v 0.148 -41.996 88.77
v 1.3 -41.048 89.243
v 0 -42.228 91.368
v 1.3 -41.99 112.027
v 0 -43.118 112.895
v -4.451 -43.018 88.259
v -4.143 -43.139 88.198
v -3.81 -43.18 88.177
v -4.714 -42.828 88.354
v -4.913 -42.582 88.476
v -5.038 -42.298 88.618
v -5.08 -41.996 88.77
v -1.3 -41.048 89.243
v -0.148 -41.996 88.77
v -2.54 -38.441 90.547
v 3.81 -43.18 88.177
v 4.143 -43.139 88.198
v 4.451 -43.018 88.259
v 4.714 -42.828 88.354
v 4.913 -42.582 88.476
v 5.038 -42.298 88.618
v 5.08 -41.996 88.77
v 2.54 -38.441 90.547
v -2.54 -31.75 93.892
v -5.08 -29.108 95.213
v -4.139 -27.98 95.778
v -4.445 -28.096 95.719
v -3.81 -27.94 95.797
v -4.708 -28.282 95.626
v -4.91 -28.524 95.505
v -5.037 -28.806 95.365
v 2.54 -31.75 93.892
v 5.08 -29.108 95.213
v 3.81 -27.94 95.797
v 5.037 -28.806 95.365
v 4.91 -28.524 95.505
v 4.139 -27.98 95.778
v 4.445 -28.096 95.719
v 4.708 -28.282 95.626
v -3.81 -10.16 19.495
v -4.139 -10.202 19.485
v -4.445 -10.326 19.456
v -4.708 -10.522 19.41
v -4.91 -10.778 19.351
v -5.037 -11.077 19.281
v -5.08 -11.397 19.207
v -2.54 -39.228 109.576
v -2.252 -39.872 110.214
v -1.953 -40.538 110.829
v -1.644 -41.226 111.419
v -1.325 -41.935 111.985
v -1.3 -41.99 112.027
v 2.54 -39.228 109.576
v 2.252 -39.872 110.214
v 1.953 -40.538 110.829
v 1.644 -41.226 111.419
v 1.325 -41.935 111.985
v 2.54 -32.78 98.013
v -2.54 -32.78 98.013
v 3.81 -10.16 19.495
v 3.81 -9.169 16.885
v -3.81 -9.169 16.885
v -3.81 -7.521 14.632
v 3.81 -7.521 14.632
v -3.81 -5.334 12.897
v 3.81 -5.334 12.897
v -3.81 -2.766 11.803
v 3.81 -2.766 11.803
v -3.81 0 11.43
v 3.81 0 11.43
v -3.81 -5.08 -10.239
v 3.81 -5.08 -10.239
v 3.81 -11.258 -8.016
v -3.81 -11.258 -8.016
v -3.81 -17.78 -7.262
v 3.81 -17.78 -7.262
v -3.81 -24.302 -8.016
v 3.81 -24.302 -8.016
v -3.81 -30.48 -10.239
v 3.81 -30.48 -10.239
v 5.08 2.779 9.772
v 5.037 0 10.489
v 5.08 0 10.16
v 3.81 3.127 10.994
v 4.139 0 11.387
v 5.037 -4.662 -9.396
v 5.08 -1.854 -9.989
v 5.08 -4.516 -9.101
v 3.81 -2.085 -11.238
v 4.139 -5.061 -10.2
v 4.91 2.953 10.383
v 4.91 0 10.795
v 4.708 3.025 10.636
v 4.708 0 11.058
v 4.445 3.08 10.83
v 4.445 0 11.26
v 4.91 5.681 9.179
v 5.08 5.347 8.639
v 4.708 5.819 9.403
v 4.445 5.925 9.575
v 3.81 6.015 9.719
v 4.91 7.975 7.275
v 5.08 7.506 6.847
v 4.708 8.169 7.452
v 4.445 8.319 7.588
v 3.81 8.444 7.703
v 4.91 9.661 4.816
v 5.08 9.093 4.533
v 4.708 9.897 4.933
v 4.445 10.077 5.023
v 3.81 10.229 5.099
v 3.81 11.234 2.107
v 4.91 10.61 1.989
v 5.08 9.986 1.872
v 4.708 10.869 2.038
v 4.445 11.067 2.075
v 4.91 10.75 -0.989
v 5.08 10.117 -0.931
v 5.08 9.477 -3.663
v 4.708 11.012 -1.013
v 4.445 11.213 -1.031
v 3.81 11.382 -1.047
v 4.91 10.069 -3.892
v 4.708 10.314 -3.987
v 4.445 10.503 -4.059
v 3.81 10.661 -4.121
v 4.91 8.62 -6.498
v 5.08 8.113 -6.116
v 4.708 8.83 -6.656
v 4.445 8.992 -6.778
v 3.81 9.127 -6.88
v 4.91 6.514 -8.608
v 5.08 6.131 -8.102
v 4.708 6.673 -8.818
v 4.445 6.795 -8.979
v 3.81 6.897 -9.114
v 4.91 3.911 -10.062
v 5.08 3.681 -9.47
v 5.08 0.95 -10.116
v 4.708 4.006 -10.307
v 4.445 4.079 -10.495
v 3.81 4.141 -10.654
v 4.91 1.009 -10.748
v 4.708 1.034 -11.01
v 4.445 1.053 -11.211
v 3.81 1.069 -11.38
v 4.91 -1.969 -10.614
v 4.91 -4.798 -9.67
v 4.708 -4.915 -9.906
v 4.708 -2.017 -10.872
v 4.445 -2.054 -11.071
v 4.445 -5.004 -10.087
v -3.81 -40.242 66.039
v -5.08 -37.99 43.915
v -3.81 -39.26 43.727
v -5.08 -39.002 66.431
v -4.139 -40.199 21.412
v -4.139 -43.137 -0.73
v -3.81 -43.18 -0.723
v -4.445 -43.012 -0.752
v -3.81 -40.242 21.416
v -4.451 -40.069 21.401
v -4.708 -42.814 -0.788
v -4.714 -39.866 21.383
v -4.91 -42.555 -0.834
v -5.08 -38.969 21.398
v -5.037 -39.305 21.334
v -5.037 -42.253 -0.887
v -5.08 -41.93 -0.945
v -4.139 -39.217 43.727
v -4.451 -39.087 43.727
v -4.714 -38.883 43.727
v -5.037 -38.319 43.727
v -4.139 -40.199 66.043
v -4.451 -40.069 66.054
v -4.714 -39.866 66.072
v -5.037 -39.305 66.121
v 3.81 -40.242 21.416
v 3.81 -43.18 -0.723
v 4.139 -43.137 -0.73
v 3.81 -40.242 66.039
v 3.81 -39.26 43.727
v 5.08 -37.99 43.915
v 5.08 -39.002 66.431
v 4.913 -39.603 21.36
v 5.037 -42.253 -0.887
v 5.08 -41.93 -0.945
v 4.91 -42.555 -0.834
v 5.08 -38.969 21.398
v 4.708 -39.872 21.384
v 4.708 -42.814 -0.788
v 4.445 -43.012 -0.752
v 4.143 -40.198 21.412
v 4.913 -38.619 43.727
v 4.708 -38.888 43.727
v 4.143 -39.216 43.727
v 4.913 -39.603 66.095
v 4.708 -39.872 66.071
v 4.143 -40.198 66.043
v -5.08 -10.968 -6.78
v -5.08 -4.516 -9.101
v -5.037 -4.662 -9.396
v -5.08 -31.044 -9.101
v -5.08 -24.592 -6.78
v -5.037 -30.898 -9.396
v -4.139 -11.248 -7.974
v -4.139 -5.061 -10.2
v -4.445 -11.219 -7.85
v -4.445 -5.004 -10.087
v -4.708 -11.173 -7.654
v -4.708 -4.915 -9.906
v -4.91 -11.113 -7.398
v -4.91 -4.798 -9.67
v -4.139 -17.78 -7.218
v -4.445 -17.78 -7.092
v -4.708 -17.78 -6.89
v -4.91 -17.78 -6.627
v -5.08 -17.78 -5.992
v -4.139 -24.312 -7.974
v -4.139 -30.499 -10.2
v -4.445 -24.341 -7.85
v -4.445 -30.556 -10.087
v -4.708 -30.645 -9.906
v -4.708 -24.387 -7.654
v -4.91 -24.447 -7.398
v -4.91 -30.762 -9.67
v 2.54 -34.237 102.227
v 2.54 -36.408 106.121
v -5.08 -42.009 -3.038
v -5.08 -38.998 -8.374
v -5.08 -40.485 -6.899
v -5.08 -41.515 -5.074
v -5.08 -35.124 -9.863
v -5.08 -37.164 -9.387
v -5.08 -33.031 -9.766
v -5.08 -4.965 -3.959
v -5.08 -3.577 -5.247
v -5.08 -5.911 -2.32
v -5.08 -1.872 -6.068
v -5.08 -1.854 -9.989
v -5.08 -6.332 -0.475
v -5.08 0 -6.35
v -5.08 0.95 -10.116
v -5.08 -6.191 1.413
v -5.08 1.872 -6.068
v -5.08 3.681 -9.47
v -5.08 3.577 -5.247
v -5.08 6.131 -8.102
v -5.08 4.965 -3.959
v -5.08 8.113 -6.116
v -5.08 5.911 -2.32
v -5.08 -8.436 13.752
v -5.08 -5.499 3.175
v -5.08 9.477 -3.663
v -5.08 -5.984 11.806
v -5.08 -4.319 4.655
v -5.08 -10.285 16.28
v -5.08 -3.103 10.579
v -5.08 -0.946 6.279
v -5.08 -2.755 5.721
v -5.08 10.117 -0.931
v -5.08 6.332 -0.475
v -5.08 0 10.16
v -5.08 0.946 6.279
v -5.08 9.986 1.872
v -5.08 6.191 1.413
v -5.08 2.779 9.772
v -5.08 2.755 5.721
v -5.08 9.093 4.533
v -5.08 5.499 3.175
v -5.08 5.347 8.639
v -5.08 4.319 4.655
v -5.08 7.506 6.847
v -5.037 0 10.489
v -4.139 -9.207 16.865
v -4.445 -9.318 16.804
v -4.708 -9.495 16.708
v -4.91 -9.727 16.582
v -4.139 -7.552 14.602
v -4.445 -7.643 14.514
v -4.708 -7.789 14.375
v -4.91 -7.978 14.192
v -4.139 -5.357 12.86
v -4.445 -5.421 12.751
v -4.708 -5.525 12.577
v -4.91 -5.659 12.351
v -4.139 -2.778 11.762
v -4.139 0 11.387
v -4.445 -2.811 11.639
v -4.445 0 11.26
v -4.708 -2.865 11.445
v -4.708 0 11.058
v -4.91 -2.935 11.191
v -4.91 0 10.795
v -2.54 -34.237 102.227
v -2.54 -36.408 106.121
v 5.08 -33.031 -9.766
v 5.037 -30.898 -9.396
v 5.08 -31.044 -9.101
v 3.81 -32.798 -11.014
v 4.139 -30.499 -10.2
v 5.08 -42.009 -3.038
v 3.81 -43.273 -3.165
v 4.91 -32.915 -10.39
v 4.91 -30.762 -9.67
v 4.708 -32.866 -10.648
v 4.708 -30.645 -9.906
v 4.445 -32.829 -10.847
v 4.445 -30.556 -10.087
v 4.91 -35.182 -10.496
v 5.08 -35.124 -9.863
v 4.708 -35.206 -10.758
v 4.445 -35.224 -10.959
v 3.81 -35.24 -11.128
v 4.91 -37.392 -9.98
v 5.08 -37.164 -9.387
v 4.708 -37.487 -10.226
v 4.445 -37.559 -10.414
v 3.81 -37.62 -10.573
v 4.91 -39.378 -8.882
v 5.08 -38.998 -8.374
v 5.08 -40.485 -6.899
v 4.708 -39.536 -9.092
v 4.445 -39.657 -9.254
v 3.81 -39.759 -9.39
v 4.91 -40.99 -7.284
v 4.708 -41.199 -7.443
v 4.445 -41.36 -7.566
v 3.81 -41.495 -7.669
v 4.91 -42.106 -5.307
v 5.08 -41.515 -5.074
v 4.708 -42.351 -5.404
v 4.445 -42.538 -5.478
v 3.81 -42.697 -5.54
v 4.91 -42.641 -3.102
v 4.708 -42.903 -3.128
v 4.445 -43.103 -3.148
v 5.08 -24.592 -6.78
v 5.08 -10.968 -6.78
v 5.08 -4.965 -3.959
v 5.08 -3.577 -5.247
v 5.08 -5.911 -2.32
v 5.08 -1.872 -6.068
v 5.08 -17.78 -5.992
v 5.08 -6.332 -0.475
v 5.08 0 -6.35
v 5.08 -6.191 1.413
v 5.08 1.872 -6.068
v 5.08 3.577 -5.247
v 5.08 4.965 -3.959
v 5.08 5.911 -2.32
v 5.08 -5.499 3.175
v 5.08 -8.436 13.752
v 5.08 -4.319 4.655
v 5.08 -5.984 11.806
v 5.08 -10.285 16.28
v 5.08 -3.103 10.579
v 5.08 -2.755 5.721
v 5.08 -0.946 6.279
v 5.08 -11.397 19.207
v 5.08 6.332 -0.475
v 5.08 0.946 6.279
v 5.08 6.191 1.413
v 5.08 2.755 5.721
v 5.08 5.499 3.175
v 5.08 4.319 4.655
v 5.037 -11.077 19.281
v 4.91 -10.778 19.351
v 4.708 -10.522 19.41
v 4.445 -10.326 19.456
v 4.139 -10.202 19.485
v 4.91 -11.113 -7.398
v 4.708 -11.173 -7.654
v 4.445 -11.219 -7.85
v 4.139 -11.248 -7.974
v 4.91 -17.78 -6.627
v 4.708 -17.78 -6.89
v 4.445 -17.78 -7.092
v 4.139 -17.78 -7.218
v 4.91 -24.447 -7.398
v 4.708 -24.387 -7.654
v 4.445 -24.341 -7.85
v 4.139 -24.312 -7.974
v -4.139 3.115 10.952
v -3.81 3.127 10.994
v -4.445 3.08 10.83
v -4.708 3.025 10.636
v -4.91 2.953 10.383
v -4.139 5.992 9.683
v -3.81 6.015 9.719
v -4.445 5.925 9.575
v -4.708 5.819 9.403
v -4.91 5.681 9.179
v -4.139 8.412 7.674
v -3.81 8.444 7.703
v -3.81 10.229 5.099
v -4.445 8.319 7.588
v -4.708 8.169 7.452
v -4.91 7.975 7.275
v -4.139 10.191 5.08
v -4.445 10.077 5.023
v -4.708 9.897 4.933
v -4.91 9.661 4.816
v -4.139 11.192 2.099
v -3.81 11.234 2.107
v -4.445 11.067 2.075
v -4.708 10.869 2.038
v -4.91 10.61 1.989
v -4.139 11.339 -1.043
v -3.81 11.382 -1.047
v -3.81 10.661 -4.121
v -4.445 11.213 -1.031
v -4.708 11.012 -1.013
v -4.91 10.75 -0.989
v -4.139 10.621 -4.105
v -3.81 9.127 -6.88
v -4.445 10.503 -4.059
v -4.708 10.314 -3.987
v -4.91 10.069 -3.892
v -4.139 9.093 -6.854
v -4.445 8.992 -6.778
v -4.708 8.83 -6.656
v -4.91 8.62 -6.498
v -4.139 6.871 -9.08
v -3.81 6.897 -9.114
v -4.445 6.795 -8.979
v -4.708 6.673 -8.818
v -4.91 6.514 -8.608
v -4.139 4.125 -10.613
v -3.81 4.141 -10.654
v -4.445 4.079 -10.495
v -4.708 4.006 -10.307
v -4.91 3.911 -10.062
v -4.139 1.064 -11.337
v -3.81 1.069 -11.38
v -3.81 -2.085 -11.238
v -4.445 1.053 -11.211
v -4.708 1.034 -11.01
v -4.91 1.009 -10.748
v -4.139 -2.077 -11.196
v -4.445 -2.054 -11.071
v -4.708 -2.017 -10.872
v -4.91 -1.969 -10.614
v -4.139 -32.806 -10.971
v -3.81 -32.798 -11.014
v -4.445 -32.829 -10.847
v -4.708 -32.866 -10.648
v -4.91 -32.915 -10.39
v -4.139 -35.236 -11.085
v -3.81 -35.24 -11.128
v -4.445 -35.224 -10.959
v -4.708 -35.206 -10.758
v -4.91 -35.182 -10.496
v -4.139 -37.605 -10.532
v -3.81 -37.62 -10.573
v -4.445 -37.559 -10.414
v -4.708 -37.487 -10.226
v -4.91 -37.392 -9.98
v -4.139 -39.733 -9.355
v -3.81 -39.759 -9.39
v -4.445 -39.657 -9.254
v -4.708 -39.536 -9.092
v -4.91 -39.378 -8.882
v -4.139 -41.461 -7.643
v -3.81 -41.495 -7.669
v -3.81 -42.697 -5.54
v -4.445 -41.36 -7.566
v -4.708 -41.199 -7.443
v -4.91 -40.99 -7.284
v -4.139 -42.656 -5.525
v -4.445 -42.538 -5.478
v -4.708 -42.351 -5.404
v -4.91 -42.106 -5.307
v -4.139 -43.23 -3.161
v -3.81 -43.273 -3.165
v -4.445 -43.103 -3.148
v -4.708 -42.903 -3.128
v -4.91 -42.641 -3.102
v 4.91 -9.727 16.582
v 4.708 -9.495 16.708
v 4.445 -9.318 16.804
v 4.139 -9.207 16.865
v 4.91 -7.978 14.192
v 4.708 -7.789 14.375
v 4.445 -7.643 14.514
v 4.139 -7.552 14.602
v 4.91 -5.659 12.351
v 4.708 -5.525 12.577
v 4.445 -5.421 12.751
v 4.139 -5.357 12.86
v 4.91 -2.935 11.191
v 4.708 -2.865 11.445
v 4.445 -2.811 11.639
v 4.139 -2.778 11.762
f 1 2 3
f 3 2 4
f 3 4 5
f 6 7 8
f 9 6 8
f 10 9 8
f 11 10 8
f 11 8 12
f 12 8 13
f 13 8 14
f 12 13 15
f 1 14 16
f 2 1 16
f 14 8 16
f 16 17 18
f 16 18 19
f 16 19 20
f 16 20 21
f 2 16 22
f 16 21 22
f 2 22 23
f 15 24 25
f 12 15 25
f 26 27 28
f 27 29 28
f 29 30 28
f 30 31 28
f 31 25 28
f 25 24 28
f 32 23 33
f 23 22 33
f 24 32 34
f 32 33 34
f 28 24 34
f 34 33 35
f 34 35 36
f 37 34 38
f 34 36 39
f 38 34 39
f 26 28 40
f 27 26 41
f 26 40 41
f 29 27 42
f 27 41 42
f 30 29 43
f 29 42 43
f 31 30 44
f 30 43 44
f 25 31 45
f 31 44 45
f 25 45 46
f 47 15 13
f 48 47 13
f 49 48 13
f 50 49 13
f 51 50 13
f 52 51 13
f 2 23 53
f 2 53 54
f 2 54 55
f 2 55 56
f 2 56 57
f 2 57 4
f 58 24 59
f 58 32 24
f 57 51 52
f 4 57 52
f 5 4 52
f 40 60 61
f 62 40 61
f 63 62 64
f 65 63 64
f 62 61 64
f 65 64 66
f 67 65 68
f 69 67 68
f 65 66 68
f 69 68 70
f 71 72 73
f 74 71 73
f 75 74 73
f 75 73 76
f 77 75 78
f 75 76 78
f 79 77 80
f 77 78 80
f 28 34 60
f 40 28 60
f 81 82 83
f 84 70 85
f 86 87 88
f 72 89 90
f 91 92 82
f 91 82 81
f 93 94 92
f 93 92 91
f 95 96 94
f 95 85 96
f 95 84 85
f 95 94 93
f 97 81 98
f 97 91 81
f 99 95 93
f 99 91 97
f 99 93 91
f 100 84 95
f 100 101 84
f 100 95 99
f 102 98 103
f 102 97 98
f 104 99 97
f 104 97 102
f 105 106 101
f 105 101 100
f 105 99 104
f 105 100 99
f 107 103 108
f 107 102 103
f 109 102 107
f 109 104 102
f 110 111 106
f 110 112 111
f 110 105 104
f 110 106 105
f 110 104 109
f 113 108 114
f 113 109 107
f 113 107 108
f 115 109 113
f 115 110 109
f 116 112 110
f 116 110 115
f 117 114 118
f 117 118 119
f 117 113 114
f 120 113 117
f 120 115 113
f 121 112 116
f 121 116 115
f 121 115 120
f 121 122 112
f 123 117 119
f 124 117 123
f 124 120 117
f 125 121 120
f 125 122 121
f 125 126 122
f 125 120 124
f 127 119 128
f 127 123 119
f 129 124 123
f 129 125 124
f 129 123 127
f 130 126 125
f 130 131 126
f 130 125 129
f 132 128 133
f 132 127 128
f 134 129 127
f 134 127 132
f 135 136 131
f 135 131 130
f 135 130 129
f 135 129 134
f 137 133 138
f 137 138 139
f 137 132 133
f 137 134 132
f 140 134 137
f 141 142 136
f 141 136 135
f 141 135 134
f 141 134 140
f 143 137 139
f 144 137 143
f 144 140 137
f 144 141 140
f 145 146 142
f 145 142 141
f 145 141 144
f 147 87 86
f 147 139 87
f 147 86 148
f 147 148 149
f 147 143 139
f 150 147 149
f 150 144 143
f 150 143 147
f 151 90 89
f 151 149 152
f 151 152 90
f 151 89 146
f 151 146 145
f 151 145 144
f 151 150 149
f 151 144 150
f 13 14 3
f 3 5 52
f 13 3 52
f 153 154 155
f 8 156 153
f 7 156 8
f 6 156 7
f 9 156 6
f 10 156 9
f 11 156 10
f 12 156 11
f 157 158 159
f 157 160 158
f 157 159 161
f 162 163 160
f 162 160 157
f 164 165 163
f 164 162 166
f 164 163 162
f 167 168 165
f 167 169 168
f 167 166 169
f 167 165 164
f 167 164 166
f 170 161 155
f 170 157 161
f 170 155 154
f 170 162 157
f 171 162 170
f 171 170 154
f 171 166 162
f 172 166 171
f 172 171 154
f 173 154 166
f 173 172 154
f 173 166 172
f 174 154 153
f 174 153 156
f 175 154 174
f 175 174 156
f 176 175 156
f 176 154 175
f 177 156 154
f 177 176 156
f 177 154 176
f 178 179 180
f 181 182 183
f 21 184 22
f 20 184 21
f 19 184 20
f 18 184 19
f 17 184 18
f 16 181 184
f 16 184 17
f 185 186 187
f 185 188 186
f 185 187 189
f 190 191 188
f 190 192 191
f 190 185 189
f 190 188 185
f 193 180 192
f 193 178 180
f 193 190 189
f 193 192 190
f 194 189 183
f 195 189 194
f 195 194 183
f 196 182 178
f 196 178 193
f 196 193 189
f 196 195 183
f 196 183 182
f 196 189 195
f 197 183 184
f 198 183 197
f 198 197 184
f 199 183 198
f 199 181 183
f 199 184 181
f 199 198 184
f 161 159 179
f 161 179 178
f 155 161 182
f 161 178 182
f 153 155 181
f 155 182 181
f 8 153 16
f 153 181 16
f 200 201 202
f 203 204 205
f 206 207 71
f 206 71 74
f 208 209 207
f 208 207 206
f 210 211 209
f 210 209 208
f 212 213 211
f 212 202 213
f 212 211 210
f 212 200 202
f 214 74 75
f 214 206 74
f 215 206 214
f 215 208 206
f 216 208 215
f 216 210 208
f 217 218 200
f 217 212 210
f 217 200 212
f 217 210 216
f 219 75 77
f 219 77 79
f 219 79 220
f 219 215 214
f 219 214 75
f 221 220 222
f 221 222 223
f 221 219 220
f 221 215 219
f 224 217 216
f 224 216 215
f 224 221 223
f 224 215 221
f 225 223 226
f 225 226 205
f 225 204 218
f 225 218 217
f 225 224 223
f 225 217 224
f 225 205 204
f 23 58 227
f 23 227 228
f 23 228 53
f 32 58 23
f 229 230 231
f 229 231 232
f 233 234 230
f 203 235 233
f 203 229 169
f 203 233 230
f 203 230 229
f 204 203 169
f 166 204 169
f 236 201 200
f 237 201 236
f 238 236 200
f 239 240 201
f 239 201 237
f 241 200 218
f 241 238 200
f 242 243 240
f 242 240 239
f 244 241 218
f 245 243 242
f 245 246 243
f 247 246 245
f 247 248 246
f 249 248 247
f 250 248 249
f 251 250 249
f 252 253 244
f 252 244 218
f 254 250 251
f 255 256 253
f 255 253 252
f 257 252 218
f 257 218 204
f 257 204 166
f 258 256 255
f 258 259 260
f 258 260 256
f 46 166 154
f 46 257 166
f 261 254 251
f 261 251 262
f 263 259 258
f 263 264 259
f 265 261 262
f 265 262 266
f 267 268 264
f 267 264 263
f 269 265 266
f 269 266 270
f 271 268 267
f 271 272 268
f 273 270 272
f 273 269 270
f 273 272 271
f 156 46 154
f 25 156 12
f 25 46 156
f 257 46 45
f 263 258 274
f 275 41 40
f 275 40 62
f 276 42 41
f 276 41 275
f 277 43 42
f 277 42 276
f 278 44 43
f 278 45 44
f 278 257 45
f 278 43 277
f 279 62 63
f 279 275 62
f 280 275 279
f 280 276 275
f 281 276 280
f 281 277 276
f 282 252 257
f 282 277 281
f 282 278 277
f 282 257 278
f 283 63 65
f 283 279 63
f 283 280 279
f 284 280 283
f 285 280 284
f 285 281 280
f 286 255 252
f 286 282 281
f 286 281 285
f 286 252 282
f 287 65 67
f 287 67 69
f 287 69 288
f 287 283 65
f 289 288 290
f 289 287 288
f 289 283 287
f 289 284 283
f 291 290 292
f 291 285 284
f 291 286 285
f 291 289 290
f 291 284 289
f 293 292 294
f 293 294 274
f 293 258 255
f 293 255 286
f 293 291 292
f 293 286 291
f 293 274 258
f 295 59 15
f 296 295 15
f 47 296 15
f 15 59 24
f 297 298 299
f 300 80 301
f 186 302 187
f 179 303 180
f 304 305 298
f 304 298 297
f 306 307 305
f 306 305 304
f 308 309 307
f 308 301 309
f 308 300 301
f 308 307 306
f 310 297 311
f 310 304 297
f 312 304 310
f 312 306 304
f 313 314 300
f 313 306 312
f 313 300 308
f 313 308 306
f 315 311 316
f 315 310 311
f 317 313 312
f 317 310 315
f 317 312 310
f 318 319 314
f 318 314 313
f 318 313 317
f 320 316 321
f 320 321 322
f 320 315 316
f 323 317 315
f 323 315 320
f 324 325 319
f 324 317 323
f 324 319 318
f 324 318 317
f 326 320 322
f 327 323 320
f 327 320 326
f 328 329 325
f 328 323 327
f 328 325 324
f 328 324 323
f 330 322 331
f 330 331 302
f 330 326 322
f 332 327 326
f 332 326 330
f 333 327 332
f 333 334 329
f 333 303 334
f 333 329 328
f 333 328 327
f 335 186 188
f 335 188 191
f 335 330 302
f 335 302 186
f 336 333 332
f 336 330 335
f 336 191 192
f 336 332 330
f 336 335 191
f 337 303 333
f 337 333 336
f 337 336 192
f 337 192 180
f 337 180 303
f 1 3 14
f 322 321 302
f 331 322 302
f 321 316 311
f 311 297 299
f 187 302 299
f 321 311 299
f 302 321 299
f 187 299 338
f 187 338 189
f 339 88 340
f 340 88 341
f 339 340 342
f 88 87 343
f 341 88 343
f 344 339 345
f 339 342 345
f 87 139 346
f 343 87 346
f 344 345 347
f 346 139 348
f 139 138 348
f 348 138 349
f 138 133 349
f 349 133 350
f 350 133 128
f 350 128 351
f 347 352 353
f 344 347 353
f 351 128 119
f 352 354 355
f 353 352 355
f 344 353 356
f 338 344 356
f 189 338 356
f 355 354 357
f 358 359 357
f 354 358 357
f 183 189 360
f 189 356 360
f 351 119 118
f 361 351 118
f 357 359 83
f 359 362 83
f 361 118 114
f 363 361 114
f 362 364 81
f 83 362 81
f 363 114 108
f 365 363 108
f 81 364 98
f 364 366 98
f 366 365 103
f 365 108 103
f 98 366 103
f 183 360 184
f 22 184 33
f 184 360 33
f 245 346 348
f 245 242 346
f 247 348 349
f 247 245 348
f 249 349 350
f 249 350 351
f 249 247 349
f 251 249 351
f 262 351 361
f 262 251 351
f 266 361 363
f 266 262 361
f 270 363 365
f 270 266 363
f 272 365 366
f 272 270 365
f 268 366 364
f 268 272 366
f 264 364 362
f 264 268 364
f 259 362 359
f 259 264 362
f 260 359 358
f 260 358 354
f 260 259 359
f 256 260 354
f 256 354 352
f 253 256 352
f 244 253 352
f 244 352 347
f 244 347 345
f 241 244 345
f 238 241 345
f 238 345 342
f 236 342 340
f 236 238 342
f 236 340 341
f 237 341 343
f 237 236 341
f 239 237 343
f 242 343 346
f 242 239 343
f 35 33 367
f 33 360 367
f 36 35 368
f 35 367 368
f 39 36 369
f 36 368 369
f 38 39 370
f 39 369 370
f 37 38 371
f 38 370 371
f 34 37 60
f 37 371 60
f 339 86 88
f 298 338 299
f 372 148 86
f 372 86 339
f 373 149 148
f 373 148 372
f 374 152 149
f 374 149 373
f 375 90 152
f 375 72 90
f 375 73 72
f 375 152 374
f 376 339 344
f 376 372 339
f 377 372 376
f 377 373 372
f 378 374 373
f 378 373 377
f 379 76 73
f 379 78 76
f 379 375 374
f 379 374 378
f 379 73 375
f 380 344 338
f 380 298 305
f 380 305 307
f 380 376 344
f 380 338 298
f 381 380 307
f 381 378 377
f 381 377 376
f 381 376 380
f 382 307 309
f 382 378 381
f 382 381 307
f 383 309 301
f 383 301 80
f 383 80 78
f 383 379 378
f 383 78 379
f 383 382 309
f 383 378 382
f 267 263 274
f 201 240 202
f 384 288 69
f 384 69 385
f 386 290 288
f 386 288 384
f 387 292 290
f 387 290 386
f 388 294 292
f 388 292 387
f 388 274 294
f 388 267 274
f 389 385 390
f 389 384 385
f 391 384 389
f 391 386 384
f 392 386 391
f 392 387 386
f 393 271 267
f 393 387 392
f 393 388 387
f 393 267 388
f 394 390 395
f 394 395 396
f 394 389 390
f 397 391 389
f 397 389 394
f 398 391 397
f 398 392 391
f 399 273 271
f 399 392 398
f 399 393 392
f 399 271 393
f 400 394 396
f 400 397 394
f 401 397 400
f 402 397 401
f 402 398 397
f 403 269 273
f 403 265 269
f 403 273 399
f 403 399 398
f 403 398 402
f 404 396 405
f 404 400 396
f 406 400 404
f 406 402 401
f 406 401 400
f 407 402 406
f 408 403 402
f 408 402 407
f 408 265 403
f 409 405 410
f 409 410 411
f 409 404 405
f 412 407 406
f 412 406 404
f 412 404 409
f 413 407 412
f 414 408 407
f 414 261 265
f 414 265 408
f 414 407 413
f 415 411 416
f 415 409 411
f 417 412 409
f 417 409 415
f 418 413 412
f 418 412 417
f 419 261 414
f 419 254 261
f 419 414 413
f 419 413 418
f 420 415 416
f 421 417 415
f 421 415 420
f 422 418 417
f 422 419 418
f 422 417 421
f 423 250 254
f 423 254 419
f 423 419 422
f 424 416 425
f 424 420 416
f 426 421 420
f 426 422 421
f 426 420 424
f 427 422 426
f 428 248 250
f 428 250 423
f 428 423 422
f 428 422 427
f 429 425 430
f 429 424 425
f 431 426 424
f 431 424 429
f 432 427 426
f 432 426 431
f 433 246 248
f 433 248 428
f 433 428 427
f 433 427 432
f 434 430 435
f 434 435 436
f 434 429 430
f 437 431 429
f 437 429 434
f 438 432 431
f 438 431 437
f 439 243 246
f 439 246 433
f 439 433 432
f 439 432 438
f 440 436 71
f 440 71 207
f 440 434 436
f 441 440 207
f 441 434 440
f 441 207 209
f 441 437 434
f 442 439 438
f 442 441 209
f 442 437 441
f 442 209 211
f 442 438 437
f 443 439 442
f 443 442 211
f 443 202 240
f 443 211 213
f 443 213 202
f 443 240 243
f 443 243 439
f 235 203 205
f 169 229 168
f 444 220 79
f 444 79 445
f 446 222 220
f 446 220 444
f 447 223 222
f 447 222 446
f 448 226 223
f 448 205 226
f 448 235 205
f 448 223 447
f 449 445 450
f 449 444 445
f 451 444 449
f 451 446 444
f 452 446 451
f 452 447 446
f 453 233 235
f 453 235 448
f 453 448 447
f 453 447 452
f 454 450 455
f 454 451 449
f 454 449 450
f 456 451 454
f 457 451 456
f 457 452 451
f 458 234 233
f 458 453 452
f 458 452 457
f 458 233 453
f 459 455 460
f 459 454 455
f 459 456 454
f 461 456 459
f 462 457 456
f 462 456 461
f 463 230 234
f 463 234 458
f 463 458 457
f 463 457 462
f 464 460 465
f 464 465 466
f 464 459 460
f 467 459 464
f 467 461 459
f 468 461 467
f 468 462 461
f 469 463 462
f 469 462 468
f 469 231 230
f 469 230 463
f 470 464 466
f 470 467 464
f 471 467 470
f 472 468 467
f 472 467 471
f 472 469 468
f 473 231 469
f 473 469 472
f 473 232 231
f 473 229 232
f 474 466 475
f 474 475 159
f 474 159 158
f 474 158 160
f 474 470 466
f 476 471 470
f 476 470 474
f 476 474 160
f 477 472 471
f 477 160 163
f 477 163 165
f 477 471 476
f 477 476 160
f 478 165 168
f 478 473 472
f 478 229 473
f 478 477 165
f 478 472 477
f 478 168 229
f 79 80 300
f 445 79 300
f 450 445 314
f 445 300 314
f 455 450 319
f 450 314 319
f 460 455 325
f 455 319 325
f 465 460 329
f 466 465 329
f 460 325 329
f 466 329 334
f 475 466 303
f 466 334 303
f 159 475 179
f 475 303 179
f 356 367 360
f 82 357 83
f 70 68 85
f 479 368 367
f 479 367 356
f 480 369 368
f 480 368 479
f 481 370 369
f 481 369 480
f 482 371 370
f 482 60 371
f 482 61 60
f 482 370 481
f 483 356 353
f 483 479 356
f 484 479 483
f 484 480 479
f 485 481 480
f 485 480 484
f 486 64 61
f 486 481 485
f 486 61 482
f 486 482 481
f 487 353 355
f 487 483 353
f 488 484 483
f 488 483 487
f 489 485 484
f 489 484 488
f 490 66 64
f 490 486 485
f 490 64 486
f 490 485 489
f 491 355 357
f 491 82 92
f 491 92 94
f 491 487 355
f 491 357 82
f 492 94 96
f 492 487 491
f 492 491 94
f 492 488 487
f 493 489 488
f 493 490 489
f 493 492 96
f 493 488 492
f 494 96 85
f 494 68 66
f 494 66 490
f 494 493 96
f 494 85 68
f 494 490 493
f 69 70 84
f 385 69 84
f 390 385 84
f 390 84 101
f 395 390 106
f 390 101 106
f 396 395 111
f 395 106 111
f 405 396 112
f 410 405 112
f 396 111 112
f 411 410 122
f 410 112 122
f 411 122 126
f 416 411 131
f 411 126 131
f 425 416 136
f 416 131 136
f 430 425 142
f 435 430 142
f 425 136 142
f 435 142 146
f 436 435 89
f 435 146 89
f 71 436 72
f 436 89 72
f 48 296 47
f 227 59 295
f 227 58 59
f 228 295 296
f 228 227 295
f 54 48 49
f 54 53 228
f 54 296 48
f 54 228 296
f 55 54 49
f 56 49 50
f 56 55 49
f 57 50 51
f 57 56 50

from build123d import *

# Parameters (mm, degrees)
SKETCH1_R           = 6.35
BOSS_EXTRUDE1_DEPTH = 5.08
FILLET1_R           = 1.27
BOSS_EXTRUDE2_DEPTH = 2.54
CHAMFER1_SIZE       = 3.81
CHAMFER1_SIZE_2     = 1.776632178
FILLET2_R           = 25.4


with BuildPart() as part:
    # Sketch1 → Boss-Extrude1 (new, symmetric)
    with BuildSketch(Plane(origin=(0, 0, 0), x_dir=(0, 0, -1), z_dir=(1, 0, 0))):
        with BuildLine():
            Line((-88.177460957, -43.18), (-95.797460957, -27.94))
            Line((-95.797460957, -27.94), (-19.494713075, -10.16))
            ThreePointArc((-19.494713075, -10.16), (-13.691248965, -6.485853779), (-11.43, 0))
            ThreePointArc((-11.43, 0), (2.608865683, 11.128284677), (10.23906734, -5.08))
            ThreePointArc((10.23906734, -5.08), (7.261735691, -17.78), (10.23906734, -30.48))
            ThreePointArc((10.23906734, -30.48), (9.389887981, -39.759205985), (0.722539043, -43.18))
            ThreePointArc((0.722539043, -43.18), (-43.727460957, -39.260382077), (-88.177460957, -43.18))
        make_face()
        Circle(SKETCH1_R, mode=Mode.SUBTRACT)
    extrude(amount=BOSS_EXTRUDE1_DEPTH, both=True)

    # Fillet1
    fillet1_edges = [part.edges().sort_by_distance(p)[0] for p in [
        (5.08, -39.260382077, 43.727460957),
        (5.08, -39.759205985, -9.389887981),
        (5.08, -17.78, -7.261735691),
        (5.08, 11.128284677, -2.608865683),
        (5.08, -6.485853779, 13.691248965),
        (-5.08, 11.128284677, -2.608865683),
        (5.08, -19.05, 57.646087016),
        (-5.08, -17.78, -7.261735691),
        (-5.08, -39.759205985, -9.389887981),
        (-5.08, -39.260382077, 43.727460957),
        (-5.08, -19.05, 57.646087016),
        (-5.08, -6.485853779, 13.691248965),
    ]]
    fillet(fillet1_edges, radius=FILLET1_R)

    # Sketch3 → Boss-Extrude2 (add, symmetric)
    with BuildSketch(Plane(origin=(0, 0, 0), x_dir=(0, 0, -1), z_dir=(1, 0, 0))):
        Polygon((-93.892460957, -31.75), (-106.592460957, -34.925), (-112.942460957, -43.18), (-92.622460957, -42.339662192), (-43.915351624, -37.990451226), align=None)
    extrude(amount=BOSS_EXTRUDE2_DEPTH, both=True)

    # Chamfer1
    # the kernel refuses this chamfer: 3.81, 1.776632178 mm, written as the material it takes off along each edge
    with BuildSketch(Plane(origin=(-2.54, -43.587894094, 122.805646834), x_dir=(-0.016311164131110324, 0.9990130464553615, 0.041314391398951954), z_dir=(0, 0.041319888426956664, -0.999145968725483))) as chamfer1_piece_1_section:
        Polygon((CHAMFER1_SIZE * 0.999866964113, CHAMFER1_SIZE * 0.0163111641311), (-CHAMFER1_SIZE_2 * 0.0163111641272, CHAMFER1_SIZE_2 * 0.999866963871), (0, 0), align=None)
    chamfer1_piece_1 = extrude(amount=40.080601841, mode=Mode.PRIVATE)
    chamfer1_piece_1 = split(chamfer1_piece_1, bisect_by=Plane(origin=(-1.976451392, -34.769993735, 92.38246409), z_dir=(0, -0.44721359549995887, 0.8944271909999154)), keep=Keep.TOP, mode=Mode.PRIVATE)
    add(chamfer1_piece_1, mode=Mode.SUBTRACT)
    with BuildSketch(Plane(origin=(2.54, -43.587894094, 122.805646834), x_dir=(0.016311164131110324, 0.9990130464553615, 0.041314391398951954), z_dir=(0, 0.041319888426956664, -0.999145968725483))) as chamfer1_piece_2_section:
        Polygon((CHAMFER1_SIZE * 0.999866964113, -CHAMFER1_SIZE * 0.0163111641311), (-CHAMFER1_SIZE_2 * 0.0163111641272, -CHAMFER1_SIZE_2 * 0.999866963871), (0, 0), align=None)
    chamfer1_piece_2 = extrude(amount=40.080601841, mode=Mode.PRIVATE)
    chamfer1_piece_2 = split(chamfer1_piece_2, bisect_by=Plane(origin=(1.976451392, -34.769993735, 92.38246409), z_dir=(0, -0.44721359549995887, 0.8944271909999154)), keep=Keep.TOP, mode=Mode.PRIVATE)
    add(chamfer1_piece_2, mode=Mode.SUBTRACT)

    # Fillet2
    fillet2_edges = [part.edges().sort_by_distance(p)[0] for p in [
        (0, -34.925, 106.592460957),
    ]]
    fillet(fillet2_edges, radius=FILLET2_R)

    # Chamfer2
    # the kernel refuses this chamfer: 1.27, 0.83499617 mm, written as the material it takes off along each edge
    with BuildSketch(Plane(origin=(-0.763367822, -43.506315275, 120.833009659), x_dir=(0.9993026620124814, -0.03730696112582517, -0.0015428371024072082), z_dir=(0, 0.04131988842701986, -0.9991459687254804))) as chamfer2_piece_1_section:
        with BuildLine():
            Line((0.874521065, 0), (-0.619435505, -1.161345341))
            Line((-0.619435505, -1.161345341), (-0.642038856, -1.149758774))
            ThreePointArc((-0.642038856, -1.149758774), (-0.322768515, -0.573982799), (-0.022603351, 0.011586567))
            Line((-0.022603351, 0.011586567), (0.000948407, 0.025382288))
            ThreePointArc((0.000948407, 0.025382288), (0.437599315, 0.009066868), (0.875469472, 0.025382288))
            Line((0.875469472, 0.025382288), (0.874521065, 0))
        make_face()
    chamfer2_piece_1 = extrude(amount=36.131955223, mode=Mode.PRIVATE)
    chamfer2_piece_1 = split(chamfer2_piece_1, bisect_by=Plane(origin=(-0.672553729, -35.934823141, 91.800049387), z_dir=(0, -0.44721359549995887, 0.8944271909999154)), keep=Keep.TOP, mode=Mode.PRIVATE)
    add(chamfer2_piece_1, mode=Mode.SUBTRACT)
    with BuildSketch(Plane(origin=(0.763367822, -43.506315275, 120.833009659), x_dir=(0.4373449734128742, 0.8985257946973667, 0.03715872029494756), z_dir=(0, 0.04131988842701986, -0.9991459687254804))) as chamfer2_piece_2_section:
        with BuildLine():
            Line((1.316215539, 0), (-0.411565873, -0.771622074))
            Line((-0.411565873, -0.771622074), (-0.434407936, -0.760513512))
            ThreePointArc((-0.434407936, -0.760513512), (-0.213942404, -0.381842921), (-0.022842063, 0.011108562))
            Line((-0.022842063, 0.011108562), (0.000414304, 0.025396621))
            ThreePointArc((0.000414304, 0.025396621), (0.658346981, 0.014663545), (1.316629843, 0.025396621))
            Line((1.316629843, 0.025396621), (1.316215539, 0))
        make_face()
    chamfer2_piece_2 = extrude(amount=36.131955223, mode=Mode.PRIVATE)
    chamfer2_piece_2 = split(chamfer2_piece_2, bisect_by=Plane(origin=(0.672553729, -35.934823141, 91.800049387), z_dir=(0, -0.44721359549995887, 0.8944271909999154)), keep=Keep.TOP, mode=Mode.PRIVATE)
    add(chamfer2_piece_2, mode=Mode.SUBTRACT)


solid = part.part
